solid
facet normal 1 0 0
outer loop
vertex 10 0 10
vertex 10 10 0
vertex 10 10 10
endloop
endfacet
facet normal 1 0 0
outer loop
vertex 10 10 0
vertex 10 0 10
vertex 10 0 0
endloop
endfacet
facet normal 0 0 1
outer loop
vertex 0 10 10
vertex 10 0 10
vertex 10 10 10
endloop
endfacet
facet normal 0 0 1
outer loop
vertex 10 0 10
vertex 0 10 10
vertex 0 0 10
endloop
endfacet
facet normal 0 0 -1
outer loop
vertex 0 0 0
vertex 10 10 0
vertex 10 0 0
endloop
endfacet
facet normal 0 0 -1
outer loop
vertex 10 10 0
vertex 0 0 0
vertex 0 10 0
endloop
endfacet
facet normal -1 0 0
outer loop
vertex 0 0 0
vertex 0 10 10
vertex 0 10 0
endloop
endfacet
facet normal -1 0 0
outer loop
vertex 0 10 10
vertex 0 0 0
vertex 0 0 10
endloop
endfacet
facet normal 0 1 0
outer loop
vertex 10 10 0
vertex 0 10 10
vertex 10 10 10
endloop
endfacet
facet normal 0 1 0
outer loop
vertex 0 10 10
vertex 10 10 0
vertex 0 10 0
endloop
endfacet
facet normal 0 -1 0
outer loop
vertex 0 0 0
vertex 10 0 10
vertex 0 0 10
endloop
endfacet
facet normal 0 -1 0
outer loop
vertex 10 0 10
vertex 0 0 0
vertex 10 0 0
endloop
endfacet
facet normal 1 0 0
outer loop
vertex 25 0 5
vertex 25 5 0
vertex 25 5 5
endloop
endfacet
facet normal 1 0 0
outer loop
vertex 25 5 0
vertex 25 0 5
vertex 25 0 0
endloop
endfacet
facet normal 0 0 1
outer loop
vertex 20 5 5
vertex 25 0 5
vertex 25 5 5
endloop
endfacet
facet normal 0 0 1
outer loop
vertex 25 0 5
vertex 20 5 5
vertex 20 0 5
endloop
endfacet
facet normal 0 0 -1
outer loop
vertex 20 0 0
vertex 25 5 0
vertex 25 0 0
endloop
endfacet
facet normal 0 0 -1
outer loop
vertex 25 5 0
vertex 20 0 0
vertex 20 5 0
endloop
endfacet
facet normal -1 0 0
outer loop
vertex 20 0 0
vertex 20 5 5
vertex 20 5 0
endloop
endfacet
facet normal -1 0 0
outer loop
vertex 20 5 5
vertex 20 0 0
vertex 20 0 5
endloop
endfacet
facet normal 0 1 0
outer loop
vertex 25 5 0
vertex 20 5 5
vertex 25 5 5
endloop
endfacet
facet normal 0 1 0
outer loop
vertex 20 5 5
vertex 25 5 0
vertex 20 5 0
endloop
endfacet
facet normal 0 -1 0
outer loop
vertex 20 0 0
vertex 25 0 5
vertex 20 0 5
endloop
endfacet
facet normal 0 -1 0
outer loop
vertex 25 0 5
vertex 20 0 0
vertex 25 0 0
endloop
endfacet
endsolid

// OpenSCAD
// Two blocks apart (ADR-0071): two bodies, the larger one first.
cube([10, 10, 10]);
translate([20, 0, 0]) cube([5, 5, 5]);
